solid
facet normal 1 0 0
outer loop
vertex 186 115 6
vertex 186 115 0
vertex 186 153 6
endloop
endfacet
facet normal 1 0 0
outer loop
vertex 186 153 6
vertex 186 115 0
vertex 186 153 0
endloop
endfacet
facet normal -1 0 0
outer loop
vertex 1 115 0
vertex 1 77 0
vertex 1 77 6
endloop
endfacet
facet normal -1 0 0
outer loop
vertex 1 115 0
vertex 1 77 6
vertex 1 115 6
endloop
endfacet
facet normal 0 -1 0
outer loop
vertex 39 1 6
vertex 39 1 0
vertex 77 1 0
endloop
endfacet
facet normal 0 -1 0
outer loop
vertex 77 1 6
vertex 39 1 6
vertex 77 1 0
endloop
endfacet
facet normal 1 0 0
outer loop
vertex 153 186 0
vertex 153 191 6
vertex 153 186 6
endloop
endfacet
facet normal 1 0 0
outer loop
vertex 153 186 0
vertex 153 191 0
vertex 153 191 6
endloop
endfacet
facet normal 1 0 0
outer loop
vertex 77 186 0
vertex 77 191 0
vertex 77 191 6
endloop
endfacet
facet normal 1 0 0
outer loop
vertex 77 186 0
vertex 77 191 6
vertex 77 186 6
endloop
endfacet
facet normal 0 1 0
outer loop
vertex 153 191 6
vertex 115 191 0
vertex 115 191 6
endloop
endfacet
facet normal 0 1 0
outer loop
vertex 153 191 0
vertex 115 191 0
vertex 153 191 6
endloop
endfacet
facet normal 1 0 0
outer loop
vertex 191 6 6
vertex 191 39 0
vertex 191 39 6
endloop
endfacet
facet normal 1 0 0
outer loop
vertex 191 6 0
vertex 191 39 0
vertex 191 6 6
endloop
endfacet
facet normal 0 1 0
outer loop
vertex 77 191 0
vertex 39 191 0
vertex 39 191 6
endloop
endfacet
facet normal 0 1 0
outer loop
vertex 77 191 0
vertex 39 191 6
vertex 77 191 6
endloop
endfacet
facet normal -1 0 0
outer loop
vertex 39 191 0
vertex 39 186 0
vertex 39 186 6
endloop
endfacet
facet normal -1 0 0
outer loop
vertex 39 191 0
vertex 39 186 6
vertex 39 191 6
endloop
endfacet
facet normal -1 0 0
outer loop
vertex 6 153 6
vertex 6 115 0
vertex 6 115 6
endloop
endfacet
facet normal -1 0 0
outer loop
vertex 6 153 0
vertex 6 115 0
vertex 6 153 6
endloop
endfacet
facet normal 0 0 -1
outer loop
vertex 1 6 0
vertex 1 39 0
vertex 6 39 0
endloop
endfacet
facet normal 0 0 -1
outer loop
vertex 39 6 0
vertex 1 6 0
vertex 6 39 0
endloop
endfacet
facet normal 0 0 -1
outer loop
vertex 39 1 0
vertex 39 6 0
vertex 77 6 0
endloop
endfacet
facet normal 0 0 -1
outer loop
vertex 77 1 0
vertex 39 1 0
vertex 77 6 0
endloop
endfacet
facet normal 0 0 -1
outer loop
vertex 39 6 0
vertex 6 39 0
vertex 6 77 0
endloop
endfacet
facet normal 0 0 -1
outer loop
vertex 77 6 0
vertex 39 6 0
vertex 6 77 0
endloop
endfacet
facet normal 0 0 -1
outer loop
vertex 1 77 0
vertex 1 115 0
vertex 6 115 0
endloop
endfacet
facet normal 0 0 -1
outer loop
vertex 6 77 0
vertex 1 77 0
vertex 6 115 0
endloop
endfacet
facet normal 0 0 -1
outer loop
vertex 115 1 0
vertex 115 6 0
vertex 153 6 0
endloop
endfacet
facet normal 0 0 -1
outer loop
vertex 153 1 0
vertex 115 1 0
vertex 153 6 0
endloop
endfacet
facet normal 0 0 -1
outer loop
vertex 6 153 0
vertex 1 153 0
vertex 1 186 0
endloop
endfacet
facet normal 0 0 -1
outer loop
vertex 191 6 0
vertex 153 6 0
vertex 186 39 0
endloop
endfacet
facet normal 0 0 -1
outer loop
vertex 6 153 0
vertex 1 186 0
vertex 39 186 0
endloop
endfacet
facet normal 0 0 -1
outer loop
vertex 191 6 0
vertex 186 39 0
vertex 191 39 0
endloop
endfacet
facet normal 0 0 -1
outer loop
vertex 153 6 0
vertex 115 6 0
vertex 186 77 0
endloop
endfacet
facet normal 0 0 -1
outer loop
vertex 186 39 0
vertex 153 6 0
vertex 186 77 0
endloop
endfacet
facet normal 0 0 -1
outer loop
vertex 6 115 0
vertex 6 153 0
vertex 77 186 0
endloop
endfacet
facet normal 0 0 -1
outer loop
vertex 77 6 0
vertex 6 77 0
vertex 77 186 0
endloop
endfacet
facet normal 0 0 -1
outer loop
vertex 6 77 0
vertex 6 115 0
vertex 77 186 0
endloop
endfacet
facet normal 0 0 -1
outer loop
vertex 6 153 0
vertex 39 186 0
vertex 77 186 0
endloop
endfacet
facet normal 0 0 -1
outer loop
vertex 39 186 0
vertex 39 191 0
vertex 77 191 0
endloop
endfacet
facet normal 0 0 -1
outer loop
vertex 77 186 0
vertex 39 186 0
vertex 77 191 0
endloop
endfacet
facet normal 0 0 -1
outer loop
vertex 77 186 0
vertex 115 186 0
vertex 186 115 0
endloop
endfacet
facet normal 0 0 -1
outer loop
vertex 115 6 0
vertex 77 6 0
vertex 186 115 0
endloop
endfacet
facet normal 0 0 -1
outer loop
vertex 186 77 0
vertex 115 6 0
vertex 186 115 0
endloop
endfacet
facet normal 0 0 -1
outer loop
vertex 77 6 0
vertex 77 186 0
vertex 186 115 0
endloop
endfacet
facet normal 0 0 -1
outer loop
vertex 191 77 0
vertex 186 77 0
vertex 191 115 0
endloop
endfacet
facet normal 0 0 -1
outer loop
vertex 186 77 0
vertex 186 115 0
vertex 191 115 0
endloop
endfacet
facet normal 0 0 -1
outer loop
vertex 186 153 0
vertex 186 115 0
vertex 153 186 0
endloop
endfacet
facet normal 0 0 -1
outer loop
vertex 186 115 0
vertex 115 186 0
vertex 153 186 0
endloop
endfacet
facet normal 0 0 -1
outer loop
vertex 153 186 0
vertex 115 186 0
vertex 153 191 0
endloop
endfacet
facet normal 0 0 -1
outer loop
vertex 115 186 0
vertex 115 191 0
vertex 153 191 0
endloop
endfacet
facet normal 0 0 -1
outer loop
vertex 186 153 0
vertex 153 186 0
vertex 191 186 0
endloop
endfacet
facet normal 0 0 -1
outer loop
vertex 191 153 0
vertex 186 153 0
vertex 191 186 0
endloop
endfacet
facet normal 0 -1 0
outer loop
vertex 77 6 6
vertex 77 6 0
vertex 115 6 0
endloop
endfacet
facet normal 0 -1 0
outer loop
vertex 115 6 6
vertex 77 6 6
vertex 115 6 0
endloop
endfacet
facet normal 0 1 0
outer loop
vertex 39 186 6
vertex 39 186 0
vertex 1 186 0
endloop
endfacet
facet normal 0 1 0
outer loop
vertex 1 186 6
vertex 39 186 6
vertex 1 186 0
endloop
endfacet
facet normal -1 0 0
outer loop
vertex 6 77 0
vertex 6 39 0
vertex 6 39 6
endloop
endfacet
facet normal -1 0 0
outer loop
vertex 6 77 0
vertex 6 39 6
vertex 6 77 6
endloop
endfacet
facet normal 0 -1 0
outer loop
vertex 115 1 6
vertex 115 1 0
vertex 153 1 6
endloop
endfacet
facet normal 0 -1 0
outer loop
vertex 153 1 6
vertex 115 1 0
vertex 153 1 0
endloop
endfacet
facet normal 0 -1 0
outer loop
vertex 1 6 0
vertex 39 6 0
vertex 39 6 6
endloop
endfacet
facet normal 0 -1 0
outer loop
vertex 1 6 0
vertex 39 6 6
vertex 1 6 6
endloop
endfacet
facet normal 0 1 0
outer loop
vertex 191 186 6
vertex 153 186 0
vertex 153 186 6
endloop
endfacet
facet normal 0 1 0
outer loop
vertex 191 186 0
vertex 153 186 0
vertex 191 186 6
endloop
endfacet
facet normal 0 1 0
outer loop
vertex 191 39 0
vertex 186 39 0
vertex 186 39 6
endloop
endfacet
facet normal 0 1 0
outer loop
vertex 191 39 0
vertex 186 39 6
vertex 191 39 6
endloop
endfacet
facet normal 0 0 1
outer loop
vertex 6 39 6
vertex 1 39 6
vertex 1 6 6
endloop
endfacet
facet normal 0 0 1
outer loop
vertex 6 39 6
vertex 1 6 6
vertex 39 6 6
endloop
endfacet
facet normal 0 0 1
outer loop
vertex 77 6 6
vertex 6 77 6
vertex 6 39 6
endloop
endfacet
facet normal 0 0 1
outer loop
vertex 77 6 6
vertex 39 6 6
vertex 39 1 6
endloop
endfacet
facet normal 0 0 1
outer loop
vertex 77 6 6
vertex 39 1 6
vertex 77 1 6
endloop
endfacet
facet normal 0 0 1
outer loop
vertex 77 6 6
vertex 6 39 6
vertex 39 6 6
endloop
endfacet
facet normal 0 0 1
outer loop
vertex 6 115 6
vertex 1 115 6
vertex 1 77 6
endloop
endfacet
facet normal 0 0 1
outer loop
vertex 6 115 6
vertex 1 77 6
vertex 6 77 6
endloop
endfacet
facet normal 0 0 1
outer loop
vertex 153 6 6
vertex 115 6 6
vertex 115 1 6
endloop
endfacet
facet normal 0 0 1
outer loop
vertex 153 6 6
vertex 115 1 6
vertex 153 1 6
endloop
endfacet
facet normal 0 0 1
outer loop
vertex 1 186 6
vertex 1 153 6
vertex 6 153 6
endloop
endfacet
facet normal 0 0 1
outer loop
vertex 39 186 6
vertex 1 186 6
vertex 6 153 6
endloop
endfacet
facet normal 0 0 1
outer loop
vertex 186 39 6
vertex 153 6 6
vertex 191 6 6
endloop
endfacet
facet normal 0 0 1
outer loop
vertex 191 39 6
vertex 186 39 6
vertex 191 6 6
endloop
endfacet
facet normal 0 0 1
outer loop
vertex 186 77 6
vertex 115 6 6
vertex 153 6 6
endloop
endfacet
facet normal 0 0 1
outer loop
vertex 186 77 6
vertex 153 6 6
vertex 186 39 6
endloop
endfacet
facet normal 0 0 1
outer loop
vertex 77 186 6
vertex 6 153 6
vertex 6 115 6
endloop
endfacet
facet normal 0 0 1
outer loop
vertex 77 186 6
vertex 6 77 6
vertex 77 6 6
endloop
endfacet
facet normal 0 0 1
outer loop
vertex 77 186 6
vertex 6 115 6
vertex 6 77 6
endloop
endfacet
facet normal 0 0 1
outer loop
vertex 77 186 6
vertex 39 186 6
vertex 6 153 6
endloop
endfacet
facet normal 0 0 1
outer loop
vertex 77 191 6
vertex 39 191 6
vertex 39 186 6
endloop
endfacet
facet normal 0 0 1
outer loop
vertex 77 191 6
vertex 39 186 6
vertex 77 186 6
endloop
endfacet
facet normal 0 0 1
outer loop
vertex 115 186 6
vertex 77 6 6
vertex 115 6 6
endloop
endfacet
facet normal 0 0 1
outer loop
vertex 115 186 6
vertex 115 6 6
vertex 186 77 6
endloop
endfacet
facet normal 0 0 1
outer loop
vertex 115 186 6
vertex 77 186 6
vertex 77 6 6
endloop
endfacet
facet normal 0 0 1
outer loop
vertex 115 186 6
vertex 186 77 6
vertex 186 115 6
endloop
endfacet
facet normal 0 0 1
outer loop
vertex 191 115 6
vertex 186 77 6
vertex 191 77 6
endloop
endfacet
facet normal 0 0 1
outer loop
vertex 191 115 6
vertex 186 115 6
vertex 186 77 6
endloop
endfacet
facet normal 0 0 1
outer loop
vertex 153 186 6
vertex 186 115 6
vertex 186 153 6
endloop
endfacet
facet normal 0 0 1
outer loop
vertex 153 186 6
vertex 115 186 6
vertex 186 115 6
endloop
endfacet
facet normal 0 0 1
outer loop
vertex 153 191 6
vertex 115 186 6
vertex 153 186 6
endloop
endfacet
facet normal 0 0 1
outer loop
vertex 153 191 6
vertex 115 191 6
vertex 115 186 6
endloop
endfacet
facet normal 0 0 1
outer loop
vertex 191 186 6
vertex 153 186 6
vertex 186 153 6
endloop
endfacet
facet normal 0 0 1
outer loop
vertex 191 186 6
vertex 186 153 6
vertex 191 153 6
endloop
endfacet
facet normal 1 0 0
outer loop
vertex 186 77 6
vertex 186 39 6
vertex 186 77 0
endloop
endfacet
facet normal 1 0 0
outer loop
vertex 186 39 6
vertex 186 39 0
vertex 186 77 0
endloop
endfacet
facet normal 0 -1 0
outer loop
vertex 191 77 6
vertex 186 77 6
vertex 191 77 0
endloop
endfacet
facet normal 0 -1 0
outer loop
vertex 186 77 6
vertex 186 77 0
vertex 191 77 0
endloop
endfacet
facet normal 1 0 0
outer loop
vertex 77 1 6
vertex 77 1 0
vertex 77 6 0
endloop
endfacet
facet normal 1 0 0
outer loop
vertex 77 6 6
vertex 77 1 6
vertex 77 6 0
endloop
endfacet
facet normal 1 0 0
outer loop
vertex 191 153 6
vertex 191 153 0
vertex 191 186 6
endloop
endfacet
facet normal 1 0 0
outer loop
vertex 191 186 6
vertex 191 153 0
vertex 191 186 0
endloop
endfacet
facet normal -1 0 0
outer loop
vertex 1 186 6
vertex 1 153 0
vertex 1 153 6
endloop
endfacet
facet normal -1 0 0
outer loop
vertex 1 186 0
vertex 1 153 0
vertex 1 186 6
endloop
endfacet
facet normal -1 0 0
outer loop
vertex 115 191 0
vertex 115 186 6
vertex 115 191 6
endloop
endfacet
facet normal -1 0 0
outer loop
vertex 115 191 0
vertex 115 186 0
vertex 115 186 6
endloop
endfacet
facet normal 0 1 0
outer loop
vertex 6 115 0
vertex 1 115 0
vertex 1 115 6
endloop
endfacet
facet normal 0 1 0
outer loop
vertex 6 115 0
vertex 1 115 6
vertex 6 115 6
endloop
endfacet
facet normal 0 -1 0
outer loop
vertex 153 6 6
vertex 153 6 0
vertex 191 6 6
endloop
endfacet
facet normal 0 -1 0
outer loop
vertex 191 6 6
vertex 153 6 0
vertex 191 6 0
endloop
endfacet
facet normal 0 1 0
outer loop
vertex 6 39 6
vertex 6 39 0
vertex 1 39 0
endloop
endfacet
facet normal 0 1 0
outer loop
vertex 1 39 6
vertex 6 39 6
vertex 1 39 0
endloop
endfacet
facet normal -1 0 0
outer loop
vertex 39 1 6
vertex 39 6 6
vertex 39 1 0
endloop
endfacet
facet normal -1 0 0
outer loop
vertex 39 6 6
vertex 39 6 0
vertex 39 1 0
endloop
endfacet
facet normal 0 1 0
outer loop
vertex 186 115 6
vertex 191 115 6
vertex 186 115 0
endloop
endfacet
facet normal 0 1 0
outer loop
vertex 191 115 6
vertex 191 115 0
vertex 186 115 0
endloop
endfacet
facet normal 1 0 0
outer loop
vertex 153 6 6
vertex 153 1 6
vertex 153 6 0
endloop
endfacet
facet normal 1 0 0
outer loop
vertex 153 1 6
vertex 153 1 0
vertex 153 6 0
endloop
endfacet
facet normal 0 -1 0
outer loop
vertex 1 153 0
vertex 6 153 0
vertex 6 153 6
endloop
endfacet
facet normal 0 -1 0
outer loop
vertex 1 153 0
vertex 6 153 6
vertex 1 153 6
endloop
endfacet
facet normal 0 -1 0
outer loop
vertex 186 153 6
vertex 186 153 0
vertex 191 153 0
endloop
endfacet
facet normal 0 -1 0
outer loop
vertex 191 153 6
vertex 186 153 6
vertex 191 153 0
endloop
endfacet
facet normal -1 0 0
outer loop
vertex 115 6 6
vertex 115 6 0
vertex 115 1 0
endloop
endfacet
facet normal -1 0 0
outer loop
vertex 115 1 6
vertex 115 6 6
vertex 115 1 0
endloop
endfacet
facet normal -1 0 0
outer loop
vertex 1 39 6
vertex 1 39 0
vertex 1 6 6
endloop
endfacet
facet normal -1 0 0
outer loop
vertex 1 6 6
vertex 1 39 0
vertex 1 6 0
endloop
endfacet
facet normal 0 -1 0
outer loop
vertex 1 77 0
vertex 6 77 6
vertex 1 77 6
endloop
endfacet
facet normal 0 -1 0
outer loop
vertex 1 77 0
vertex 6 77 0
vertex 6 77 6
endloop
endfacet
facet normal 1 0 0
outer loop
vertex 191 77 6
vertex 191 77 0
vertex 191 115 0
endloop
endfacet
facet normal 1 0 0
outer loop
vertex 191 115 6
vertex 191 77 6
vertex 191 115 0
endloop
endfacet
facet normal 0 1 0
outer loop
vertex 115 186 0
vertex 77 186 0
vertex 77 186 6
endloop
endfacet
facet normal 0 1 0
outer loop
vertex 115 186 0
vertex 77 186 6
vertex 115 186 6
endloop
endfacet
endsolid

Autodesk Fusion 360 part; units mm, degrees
sketch "Sketch1" plane through (0, 0, 0) normal (0, 0, 1) x (1, 0, 0)
  line L0 (39, 192) -> (77, 192)
  line L1 (77, 192) -> (77, 186)
  line L2 (39, 186) -> (39, 192)
  line L3 (115, 192) -> (153, 192)
  line L4 (153, 192) -> (153, 186)
  line L5 (115, 186) -> (115, 192)
  line L6 (39, 186) -> (0, 186)
  line L7 (77, 186) -> (115, 186)
  line L8 (153, 186) -> (192, 186)
  line L9 (39, 6) -> (0, 6)
  line L10 (39, 6) -> (39, 0)
  line L11 (39, 0) -> (77, 0)
  line L12 (77, 0) -> (77, 6)
  line L13 (77, 6) -> (115, 6)
  line L14 (115, 6) -> (115, 0)
  line L15 (115, 0) -> (153, 0)
  line L16 (153, 0) -> (153, 6)
  line L17 (153, 192) -> (115, 192)
  line L18 (77, 192) -> (39, 192)
  line L19 (39, 0) -> (77, 0)
  line L20 (115, 0) -> (153, 0)
  line L21 (6, 153) -> (0, 153)
  line L22 (0, 153) -> (0, 186)
  line L23 (6, 39) -> (0, 39)
  line L24 (0, 39) -> (0, 6)
  line L25 (0, 115) -> (6, 115)
  line L26 (6, 77) -> (0, 77)
  line L27 (0, 77) -> (0, 115)
  line L28 (6, 39) -> (6, 77)
  line L29 (6, 115) -> (6, 153)
  line L30 (192, 153) -> (192, 186)
  line L31 (186, 153) -> (192, 153)
  line L32 (186, 115) -> (186, 153)
  line L33 (192, 115) -> (186, 115)
  line L34 (192, 77) -> (192, 115)
  line L35 (186, 77) -> (192, 77)
  line L36 (186, 39) -> (186, 77)
  line L37 (186, 39) -> (192, 39)
  line L38 (192, 39) -> (192, 6)
  line L39 (192, 153) -> (192, 186)
  line L40 (192, 6) -> (192, 39)
  line L41 (192, 77) -> (192, 115)
  line L42 (0, 39) -> (0, 6)
  line L43 (0, 186) -> (0, 153)
  line L44 (0, 115) -> (0, 77)
  line L45 (153, 6) -> (192, 6)
  line L46 (5.915, 152.915) -> (-0.085, 152.915)
  line L47 (-0.085, 186.085) -> (-0.085, 152.915)
  line L48 (38.915, 186.085) -> (-0.085, 186.085)
  line L49 (38.915, 186.085) -> (38.915, 192.085)
  line L50 (77.085, 192.085) -> (38.915, 192.085)
  line L51 (77.085, 192.085) -> (77.085, 186.085)
  line L52 (77.085, 186.085) -> (114.915, 186.085)
  line L53 (114.915, 186.085) -> (114.915, 192.085)
  line L54 (114.915, 192.085) -> (153.085, 192.085)
  line L55 (153.085, 192.085) -> (153.085, 186.085)
  line L56 (153.085, 186.085) -> (192.085, 186.085)
  line L57 (192.085, 152.915) -> (192.085, 186.085)
  line L58 (186.085, 152.915) -> (192.085, 152.915)
  line L59 (186.085, 115.085) -> (186.085, 152.915)
  line L60 (192.085, 115.085) -> (186.085, 115.085)
  line L61 (192.085, 76.915) -> (192.085, 115.085)
  line L62 (186.085, 76.915) -> (192.085, 76.915)
  line L63 (186.085, 39.085) -> (186.085, 76.915)
  line L64 (186.085, 39.085) -> (192.085, 39.085)
  line L65 (192.085, 39.085) -> (192.085, 5.915)
  line L66 (153.085, 5.915) -> (192.085, 5.915)
  line L67 (153.085, -0.085) -> (153.085, 5.915)
  line L68 (114.915, -0.085) -> (153.085, -0.085)
  line L69 (114.915, 5.915) -> (114.915, -0.085)
  line L70 (77.085, 5.915) -> (114.915, 5.915)
  line L71 (77.085, -0.085) -> (77.085, 5.915)
  line L72 (38.915, -0.085) -> (77.085, -0.085)
  line L73 (38.915, 5.915) -> (38.915, -0.085)
  line L74 (38.915, 5.915) -> (-0.085, 5.915)
  line L75 (-0.085, 39.085) -> (-0.085, 5.915)
  line L76 (5.915, 39.085) -> (-0.085, 39.085)
  line L77 (5.915, 39.085) -> (5.915, 76.915)
  line L78 (5.915, 76.915) -> (-0.085, 76.915)
  line L79 (-0.085, 115.085) -> (-0.085, 76.915)
  line L80 (-0.085, 115.085) -> (5.915, 115.085)
  line L81 (5.915, 115.085) -> (5.915, 152.915)
  dimension "d3" = 38
  dimension "d4" = 6
  dimension "d5" = 38
  dimension "d6" = 6
  dimension "d7" = 39
  dimension "d8" = 39
  dimension "d10" = 33
  dimension "d12" = 33
  dimension "d13" = 6
  dimension "d14" = 38
  dimension "d15" = 38
  dimension "d16" = 38
  dimension "d19" = 0.085
extrude "Extrude1" add sketch "Sketch1" along normal blind 6 contours L0 L1 L2 L3 L4 L5 L6 L7 L8 L9 L10 L11 L12 L13 L14 L15 L16 L17 L18 L19 L20 L21 L22 L23 L24 L25 L26 L27 L28 L29 L30 L31 L32 L33 L34 L35 L36 L37 L38 L39 L40 L41 L42 L43 L44 L45
extrude "Extrude2" cut 2 faces at (51.6667, 192, 4) (127.6667, 192, 4) along direction (0, -1, 0) blind 1
extrude "Extrude3" cut 3 faces at (192, 28, 2) (192, 89.6667, 4) (192, 164, 4) along direction (-1, 0, 0) blind 1
extrude "Extrude4" cut 2 faces at (51.6667, 0, 4) (127.6667, 0, 4) along direction (0, 1, 0) blind 1
extrude "Extrude5" cut 3 faces at (0, 164, 4) (0, 89.6667, 4) (0, 28, 2) along direction (1, 0, 0) blind 1
